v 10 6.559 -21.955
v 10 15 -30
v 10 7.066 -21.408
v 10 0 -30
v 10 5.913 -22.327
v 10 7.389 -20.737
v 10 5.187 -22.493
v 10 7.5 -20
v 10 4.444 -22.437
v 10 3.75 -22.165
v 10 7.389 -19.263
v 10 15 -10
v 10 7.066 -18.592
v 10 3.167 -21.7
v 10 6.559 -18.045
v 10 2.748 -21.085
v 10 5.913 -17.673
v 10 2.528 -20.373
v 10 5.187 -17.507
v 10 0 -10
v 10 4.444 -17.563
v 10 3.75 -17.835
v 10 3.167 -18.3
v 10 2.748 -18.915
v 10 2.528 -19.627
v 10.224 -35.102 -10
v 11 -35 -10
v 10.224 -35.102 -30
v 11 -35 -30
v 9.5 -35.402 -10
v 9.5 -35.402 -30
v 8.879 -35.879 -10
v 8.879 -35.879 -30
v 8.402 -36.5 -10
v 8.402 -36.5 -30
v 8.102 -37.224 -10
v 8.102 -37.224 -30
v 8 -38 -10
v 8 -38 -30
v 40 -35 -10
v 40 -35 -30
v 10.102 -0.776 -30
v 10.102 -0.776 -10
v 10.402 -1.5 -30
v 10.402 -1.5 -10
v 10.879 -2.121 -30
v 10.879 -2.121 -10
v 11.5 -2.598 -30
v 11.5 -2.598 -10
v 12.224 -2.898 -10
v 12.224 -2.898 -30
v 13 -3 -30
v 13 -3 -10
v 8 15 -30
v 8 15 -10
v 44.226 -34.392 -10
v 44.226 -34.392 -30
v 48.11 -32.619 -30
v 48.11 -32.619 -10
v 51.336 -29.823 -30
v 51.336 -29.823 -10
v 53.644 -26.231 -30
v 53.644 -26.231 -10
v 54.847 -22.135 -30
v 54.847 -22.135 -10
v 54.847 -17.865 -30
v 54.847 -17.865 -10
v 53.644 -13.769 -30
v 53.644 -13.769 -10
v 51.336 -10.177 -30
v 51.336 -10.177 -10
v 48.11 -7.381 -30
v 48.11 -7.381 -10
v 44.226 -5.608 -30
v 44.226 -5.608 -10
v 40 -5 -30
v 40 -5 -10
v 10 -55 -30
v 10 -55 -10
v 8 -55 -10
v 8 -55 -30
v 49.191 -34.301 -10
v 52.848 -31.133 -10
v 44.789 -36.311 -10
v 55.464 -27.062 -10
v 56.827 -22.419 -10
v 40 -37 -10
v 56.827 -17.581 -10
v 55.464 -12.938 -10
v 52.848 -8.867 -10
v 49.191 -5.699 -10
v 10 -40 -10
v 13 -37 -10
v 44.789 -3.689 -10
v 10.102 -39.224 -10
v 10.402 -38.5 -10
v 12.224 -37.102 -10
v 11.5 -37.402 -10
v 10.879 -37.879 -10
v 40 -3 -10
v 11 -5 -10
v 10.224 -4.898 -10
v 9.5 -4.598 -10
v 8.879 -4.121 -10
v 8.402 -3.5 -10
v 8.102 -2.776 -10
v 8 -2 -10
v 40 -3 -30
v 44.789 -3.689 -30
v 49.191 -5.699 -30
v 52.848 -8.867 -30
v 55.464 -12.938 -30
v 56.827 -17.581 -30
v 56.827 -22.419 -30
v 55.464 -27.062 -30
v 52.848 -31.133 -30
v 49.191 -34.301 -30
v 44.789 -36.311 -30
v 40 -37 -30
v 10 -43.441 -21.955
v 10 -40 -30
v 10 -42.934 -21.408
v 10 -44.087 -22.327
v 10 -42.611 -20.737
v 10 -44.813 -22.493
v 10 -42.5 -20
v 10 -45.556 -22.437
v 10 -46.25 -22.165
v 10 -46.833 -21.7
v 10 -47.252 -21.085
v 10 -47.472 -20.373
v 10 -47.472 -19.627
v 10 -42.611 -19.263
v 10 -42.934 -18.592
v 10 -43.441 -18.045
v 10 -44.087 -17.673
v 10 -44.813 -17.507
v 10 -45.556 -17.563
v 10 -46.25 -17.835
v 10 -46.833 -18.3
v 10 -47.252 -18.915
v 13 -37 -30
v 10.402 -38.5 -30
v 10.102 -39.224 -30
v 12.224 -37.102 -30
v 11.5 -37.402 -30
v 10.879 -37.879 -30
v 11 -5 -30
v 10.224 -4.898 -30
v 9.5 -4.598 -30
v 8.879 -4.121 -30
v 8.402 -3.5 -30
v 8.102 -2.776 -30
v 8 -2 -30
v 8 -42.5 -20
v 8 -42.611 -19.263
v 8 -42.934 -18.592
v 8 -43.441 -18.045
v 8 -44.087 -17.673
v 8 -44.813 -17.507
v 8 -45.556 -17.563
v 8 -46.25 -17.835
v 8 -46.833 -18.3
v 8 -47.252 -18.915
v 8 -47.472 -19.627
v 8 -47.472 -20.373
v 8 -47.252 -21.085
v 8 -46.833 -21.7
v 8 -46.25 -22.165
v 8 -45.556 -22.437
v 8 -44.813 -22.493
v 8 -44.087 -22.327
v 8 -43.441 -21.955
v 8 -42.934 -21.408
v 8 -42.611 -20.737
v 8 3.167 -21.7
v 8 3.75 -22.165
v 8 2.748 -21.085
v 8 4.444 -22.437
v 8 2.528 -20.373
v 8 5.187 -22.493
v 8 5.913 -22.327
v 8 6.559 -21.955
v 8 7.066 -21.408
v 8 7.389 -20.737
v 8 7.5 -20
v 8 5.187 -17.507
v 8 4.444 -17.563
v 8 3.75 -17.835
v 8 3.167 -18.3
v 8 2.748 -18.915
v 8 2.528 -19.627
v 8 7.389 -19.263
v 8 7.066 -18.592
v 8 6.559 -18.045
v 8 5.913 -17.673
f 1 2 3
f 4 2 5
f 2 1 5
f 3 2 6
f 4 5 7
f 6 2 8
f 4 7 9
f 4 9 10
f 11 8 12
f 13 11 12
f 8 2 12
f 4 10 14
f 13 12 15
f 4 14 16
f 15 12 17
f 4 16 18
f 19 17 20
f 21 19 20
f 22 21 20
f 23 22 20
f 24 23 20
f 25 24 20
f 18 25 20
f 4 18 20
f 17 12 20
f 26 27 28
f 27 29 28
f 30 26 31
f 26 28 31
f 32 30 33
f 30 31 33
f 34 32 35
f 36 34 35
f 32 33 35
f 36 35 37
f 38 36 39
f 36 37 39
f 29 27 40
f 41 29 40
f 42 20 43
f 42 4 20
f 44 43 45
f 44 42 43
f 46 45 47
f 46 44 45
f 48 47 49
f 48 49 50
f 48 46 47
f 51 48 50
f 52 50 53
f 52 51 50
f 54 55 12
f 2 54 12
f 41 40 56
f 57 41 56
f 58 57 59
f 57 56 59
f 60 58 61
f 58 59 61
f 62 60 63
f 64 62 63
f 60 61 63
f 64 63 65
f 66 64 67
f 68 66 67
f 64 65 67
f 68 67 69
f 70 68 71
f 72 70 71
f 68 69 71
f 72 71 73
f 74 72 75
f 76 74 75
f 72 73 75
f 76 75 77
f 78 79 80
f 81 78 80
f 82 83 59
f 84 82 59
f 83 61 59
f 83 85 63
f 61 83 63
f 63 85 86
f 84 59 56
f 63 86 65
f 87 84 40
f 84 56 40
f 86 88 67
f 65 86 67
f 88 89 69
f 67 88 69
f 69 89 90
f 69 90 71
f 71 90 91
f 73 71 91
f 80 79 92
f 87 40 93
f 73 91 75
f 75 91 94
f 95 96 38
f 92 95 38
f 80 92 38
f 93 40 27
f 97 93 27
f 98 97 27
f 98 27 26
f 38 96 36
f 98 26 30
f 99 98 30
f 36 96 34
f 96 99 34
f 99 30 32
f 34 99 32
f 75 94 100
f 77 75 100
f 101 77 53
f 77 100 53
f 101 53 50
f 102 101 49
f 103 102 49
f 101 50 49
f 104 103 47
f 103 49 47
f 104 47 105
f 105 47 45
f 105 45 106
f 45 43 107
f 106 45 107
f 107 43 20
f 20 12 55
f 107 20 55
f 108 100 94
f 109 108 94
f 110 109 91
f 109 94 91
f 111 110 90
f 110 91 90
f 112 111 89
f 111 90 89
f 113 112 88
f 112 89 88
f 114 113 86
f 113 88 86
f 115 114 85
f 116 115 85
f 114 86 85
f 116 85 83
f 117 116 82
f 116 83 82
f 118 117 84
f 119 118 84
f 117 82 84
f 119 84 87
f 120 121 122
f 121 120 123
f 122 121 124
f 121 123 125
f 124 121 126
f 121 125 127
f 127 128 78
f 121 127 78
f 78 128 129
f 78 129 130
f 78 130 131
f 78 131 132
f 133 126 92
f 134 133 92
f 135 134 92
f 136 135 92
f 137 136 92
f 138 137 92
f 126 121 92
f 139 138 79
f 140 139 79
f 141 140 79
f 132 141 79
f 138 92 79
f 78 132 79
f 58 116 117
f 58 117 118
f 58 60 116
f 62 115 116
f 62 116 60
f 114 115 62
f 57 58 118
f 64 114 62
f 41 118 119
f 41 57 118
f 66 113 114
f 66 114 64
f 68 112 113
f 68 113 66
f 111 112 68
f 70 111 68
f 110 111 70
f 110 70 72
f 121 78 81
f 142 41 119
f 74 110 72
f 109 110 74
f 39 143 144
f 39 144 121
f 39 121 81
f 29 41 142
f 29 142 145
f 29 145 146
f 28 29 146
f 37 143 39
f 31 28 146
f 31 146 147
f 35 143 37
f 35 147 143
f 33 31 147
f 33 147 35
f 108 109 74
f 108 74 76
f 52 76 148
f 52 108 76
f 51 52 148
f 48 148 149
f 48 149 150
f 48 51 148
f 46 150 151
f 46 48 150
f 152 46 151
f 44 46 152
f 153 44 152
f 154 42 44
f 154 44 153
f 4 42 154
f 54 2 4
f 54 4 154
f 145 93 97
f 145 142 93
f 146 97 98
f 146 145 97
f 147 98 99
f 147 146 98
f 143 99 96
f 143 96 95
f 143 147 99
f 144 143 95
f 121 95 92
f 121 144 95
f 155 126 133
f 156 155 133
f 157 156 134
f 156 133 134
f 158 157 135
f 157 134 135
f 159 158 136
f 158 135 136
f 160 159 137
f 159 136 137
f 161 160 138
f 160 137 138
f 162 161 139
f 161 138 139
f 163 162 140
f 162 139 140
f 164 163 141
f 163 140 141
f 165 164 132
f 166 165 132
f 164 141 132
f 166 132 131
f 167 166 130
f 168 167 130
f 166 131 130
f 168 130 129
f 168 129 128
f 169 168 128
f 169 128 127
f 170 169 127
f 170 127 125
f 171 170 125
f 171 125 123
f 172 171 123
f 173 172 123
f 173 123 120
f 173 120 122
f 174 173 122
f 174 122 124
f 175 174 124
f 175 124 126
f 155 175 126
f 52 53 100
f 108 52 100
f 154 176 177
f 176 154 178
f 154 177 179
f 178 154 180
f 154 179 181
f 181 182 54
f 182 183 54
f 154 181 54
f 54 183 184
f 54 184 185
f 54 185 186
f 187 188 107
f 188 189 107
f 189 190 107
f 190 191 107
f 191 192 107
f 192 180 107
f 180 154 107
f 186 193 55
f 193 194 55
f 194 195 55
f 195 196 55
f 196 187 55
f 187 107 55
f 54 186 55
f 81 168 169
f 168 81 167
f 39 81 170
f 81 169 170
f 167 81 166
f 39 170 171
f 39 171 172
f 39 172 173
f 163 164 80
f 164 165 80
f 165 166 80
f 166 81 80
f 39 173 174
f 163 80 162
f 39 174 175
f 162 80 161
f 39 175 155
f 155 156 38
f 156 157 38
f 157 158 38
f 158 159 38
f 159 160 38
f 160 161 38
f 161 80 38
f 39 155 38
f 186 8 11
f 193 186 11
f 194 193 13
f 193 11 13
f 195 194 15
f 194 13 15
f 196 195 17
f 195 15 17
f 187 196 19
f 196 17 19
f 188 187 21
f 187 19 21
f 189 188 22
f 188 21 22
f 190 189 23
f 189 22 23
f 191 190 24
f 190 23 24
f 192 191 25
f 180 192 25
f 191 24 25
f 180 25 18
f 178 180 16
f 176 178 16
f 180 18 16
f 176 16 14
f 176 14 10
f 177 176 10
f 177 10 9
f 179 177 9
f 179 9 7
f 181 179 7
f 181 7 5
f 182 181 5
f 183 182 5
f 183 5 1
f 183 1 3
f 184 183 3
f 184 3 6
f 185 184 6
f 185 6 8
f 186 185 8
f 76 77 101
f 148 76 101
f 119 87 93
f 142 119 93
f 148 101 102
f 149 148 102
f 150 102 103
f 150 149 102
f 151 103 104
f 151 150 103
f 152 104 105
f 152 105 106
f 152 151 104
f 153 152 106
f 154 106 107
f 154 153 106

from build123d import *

# Parameters (mm, degrees)
BOSS_EXTRUDE1_START = -10
BOSS_EXTRUDE1_DEPTH = 20
SKETCH2_R           = 2.5
CUT_EXTRUDE1_DEPTH  = 79.319856997
FILLET1_R           = 3


with BuildPart() as part:
    # Sketch1 → Boss-Extrude1 (new body)
    with BuildSketch(Plane.XY.offset(BOSS_EXTRUDE1_START)):
        with BuildLine():
            Line((40, -5), (8, -5))
            Line((8, -5), (8, 15))
            Line((8, 15), (10, 15))
            Line((10, 15), (10, -3))
            Line((10, -3), (40, -3))
            ThreePointArc((40, -3), (57, -20), (40, -37))
            Line((40, -37), (10, -37))
            Line((10, -37), (10, -55))
            Line((10, -55), (8, -55))
            Line((8, -55), (8, -35))
            Line((8, -35), (40, -35))
            ThreePointArc((40, -35), (55, -20), (40, -5))
        make_face()
    extrude(amount=-BOSS_EXTRUDE1_DEPTH)

    # Sketch2 → Cut-Extrude1 (cut, through all)
    with BuildSketch(Plane(origin=(10, 0, 0), x_dir=(0, 0, -1), z_dir=(1, 0, 0))):
        with Locations(Location((20, 5, 0), (0, 0, 90))):
            Circle(SKETCH2_R)
        with Locations(Location((20, -45, 0), (0, 0, 90))):
            Circle(SKETCH2_R)
    extrude(amount=-CUT_EXTRUDE1_DEPTH, mode=Mode.SUBTRACT)

    # Fillet1
    fillet1_edges = [part.edges().sort_by_distance(p)[0] for p in [
        (10, -37, -20),
        (8, -35, -20),
        (8, -5, -20),
        (10, -3, -20),
    ]]
    fillet(fillet1_edges, radius=FILLET1_R)


solid = part.part
